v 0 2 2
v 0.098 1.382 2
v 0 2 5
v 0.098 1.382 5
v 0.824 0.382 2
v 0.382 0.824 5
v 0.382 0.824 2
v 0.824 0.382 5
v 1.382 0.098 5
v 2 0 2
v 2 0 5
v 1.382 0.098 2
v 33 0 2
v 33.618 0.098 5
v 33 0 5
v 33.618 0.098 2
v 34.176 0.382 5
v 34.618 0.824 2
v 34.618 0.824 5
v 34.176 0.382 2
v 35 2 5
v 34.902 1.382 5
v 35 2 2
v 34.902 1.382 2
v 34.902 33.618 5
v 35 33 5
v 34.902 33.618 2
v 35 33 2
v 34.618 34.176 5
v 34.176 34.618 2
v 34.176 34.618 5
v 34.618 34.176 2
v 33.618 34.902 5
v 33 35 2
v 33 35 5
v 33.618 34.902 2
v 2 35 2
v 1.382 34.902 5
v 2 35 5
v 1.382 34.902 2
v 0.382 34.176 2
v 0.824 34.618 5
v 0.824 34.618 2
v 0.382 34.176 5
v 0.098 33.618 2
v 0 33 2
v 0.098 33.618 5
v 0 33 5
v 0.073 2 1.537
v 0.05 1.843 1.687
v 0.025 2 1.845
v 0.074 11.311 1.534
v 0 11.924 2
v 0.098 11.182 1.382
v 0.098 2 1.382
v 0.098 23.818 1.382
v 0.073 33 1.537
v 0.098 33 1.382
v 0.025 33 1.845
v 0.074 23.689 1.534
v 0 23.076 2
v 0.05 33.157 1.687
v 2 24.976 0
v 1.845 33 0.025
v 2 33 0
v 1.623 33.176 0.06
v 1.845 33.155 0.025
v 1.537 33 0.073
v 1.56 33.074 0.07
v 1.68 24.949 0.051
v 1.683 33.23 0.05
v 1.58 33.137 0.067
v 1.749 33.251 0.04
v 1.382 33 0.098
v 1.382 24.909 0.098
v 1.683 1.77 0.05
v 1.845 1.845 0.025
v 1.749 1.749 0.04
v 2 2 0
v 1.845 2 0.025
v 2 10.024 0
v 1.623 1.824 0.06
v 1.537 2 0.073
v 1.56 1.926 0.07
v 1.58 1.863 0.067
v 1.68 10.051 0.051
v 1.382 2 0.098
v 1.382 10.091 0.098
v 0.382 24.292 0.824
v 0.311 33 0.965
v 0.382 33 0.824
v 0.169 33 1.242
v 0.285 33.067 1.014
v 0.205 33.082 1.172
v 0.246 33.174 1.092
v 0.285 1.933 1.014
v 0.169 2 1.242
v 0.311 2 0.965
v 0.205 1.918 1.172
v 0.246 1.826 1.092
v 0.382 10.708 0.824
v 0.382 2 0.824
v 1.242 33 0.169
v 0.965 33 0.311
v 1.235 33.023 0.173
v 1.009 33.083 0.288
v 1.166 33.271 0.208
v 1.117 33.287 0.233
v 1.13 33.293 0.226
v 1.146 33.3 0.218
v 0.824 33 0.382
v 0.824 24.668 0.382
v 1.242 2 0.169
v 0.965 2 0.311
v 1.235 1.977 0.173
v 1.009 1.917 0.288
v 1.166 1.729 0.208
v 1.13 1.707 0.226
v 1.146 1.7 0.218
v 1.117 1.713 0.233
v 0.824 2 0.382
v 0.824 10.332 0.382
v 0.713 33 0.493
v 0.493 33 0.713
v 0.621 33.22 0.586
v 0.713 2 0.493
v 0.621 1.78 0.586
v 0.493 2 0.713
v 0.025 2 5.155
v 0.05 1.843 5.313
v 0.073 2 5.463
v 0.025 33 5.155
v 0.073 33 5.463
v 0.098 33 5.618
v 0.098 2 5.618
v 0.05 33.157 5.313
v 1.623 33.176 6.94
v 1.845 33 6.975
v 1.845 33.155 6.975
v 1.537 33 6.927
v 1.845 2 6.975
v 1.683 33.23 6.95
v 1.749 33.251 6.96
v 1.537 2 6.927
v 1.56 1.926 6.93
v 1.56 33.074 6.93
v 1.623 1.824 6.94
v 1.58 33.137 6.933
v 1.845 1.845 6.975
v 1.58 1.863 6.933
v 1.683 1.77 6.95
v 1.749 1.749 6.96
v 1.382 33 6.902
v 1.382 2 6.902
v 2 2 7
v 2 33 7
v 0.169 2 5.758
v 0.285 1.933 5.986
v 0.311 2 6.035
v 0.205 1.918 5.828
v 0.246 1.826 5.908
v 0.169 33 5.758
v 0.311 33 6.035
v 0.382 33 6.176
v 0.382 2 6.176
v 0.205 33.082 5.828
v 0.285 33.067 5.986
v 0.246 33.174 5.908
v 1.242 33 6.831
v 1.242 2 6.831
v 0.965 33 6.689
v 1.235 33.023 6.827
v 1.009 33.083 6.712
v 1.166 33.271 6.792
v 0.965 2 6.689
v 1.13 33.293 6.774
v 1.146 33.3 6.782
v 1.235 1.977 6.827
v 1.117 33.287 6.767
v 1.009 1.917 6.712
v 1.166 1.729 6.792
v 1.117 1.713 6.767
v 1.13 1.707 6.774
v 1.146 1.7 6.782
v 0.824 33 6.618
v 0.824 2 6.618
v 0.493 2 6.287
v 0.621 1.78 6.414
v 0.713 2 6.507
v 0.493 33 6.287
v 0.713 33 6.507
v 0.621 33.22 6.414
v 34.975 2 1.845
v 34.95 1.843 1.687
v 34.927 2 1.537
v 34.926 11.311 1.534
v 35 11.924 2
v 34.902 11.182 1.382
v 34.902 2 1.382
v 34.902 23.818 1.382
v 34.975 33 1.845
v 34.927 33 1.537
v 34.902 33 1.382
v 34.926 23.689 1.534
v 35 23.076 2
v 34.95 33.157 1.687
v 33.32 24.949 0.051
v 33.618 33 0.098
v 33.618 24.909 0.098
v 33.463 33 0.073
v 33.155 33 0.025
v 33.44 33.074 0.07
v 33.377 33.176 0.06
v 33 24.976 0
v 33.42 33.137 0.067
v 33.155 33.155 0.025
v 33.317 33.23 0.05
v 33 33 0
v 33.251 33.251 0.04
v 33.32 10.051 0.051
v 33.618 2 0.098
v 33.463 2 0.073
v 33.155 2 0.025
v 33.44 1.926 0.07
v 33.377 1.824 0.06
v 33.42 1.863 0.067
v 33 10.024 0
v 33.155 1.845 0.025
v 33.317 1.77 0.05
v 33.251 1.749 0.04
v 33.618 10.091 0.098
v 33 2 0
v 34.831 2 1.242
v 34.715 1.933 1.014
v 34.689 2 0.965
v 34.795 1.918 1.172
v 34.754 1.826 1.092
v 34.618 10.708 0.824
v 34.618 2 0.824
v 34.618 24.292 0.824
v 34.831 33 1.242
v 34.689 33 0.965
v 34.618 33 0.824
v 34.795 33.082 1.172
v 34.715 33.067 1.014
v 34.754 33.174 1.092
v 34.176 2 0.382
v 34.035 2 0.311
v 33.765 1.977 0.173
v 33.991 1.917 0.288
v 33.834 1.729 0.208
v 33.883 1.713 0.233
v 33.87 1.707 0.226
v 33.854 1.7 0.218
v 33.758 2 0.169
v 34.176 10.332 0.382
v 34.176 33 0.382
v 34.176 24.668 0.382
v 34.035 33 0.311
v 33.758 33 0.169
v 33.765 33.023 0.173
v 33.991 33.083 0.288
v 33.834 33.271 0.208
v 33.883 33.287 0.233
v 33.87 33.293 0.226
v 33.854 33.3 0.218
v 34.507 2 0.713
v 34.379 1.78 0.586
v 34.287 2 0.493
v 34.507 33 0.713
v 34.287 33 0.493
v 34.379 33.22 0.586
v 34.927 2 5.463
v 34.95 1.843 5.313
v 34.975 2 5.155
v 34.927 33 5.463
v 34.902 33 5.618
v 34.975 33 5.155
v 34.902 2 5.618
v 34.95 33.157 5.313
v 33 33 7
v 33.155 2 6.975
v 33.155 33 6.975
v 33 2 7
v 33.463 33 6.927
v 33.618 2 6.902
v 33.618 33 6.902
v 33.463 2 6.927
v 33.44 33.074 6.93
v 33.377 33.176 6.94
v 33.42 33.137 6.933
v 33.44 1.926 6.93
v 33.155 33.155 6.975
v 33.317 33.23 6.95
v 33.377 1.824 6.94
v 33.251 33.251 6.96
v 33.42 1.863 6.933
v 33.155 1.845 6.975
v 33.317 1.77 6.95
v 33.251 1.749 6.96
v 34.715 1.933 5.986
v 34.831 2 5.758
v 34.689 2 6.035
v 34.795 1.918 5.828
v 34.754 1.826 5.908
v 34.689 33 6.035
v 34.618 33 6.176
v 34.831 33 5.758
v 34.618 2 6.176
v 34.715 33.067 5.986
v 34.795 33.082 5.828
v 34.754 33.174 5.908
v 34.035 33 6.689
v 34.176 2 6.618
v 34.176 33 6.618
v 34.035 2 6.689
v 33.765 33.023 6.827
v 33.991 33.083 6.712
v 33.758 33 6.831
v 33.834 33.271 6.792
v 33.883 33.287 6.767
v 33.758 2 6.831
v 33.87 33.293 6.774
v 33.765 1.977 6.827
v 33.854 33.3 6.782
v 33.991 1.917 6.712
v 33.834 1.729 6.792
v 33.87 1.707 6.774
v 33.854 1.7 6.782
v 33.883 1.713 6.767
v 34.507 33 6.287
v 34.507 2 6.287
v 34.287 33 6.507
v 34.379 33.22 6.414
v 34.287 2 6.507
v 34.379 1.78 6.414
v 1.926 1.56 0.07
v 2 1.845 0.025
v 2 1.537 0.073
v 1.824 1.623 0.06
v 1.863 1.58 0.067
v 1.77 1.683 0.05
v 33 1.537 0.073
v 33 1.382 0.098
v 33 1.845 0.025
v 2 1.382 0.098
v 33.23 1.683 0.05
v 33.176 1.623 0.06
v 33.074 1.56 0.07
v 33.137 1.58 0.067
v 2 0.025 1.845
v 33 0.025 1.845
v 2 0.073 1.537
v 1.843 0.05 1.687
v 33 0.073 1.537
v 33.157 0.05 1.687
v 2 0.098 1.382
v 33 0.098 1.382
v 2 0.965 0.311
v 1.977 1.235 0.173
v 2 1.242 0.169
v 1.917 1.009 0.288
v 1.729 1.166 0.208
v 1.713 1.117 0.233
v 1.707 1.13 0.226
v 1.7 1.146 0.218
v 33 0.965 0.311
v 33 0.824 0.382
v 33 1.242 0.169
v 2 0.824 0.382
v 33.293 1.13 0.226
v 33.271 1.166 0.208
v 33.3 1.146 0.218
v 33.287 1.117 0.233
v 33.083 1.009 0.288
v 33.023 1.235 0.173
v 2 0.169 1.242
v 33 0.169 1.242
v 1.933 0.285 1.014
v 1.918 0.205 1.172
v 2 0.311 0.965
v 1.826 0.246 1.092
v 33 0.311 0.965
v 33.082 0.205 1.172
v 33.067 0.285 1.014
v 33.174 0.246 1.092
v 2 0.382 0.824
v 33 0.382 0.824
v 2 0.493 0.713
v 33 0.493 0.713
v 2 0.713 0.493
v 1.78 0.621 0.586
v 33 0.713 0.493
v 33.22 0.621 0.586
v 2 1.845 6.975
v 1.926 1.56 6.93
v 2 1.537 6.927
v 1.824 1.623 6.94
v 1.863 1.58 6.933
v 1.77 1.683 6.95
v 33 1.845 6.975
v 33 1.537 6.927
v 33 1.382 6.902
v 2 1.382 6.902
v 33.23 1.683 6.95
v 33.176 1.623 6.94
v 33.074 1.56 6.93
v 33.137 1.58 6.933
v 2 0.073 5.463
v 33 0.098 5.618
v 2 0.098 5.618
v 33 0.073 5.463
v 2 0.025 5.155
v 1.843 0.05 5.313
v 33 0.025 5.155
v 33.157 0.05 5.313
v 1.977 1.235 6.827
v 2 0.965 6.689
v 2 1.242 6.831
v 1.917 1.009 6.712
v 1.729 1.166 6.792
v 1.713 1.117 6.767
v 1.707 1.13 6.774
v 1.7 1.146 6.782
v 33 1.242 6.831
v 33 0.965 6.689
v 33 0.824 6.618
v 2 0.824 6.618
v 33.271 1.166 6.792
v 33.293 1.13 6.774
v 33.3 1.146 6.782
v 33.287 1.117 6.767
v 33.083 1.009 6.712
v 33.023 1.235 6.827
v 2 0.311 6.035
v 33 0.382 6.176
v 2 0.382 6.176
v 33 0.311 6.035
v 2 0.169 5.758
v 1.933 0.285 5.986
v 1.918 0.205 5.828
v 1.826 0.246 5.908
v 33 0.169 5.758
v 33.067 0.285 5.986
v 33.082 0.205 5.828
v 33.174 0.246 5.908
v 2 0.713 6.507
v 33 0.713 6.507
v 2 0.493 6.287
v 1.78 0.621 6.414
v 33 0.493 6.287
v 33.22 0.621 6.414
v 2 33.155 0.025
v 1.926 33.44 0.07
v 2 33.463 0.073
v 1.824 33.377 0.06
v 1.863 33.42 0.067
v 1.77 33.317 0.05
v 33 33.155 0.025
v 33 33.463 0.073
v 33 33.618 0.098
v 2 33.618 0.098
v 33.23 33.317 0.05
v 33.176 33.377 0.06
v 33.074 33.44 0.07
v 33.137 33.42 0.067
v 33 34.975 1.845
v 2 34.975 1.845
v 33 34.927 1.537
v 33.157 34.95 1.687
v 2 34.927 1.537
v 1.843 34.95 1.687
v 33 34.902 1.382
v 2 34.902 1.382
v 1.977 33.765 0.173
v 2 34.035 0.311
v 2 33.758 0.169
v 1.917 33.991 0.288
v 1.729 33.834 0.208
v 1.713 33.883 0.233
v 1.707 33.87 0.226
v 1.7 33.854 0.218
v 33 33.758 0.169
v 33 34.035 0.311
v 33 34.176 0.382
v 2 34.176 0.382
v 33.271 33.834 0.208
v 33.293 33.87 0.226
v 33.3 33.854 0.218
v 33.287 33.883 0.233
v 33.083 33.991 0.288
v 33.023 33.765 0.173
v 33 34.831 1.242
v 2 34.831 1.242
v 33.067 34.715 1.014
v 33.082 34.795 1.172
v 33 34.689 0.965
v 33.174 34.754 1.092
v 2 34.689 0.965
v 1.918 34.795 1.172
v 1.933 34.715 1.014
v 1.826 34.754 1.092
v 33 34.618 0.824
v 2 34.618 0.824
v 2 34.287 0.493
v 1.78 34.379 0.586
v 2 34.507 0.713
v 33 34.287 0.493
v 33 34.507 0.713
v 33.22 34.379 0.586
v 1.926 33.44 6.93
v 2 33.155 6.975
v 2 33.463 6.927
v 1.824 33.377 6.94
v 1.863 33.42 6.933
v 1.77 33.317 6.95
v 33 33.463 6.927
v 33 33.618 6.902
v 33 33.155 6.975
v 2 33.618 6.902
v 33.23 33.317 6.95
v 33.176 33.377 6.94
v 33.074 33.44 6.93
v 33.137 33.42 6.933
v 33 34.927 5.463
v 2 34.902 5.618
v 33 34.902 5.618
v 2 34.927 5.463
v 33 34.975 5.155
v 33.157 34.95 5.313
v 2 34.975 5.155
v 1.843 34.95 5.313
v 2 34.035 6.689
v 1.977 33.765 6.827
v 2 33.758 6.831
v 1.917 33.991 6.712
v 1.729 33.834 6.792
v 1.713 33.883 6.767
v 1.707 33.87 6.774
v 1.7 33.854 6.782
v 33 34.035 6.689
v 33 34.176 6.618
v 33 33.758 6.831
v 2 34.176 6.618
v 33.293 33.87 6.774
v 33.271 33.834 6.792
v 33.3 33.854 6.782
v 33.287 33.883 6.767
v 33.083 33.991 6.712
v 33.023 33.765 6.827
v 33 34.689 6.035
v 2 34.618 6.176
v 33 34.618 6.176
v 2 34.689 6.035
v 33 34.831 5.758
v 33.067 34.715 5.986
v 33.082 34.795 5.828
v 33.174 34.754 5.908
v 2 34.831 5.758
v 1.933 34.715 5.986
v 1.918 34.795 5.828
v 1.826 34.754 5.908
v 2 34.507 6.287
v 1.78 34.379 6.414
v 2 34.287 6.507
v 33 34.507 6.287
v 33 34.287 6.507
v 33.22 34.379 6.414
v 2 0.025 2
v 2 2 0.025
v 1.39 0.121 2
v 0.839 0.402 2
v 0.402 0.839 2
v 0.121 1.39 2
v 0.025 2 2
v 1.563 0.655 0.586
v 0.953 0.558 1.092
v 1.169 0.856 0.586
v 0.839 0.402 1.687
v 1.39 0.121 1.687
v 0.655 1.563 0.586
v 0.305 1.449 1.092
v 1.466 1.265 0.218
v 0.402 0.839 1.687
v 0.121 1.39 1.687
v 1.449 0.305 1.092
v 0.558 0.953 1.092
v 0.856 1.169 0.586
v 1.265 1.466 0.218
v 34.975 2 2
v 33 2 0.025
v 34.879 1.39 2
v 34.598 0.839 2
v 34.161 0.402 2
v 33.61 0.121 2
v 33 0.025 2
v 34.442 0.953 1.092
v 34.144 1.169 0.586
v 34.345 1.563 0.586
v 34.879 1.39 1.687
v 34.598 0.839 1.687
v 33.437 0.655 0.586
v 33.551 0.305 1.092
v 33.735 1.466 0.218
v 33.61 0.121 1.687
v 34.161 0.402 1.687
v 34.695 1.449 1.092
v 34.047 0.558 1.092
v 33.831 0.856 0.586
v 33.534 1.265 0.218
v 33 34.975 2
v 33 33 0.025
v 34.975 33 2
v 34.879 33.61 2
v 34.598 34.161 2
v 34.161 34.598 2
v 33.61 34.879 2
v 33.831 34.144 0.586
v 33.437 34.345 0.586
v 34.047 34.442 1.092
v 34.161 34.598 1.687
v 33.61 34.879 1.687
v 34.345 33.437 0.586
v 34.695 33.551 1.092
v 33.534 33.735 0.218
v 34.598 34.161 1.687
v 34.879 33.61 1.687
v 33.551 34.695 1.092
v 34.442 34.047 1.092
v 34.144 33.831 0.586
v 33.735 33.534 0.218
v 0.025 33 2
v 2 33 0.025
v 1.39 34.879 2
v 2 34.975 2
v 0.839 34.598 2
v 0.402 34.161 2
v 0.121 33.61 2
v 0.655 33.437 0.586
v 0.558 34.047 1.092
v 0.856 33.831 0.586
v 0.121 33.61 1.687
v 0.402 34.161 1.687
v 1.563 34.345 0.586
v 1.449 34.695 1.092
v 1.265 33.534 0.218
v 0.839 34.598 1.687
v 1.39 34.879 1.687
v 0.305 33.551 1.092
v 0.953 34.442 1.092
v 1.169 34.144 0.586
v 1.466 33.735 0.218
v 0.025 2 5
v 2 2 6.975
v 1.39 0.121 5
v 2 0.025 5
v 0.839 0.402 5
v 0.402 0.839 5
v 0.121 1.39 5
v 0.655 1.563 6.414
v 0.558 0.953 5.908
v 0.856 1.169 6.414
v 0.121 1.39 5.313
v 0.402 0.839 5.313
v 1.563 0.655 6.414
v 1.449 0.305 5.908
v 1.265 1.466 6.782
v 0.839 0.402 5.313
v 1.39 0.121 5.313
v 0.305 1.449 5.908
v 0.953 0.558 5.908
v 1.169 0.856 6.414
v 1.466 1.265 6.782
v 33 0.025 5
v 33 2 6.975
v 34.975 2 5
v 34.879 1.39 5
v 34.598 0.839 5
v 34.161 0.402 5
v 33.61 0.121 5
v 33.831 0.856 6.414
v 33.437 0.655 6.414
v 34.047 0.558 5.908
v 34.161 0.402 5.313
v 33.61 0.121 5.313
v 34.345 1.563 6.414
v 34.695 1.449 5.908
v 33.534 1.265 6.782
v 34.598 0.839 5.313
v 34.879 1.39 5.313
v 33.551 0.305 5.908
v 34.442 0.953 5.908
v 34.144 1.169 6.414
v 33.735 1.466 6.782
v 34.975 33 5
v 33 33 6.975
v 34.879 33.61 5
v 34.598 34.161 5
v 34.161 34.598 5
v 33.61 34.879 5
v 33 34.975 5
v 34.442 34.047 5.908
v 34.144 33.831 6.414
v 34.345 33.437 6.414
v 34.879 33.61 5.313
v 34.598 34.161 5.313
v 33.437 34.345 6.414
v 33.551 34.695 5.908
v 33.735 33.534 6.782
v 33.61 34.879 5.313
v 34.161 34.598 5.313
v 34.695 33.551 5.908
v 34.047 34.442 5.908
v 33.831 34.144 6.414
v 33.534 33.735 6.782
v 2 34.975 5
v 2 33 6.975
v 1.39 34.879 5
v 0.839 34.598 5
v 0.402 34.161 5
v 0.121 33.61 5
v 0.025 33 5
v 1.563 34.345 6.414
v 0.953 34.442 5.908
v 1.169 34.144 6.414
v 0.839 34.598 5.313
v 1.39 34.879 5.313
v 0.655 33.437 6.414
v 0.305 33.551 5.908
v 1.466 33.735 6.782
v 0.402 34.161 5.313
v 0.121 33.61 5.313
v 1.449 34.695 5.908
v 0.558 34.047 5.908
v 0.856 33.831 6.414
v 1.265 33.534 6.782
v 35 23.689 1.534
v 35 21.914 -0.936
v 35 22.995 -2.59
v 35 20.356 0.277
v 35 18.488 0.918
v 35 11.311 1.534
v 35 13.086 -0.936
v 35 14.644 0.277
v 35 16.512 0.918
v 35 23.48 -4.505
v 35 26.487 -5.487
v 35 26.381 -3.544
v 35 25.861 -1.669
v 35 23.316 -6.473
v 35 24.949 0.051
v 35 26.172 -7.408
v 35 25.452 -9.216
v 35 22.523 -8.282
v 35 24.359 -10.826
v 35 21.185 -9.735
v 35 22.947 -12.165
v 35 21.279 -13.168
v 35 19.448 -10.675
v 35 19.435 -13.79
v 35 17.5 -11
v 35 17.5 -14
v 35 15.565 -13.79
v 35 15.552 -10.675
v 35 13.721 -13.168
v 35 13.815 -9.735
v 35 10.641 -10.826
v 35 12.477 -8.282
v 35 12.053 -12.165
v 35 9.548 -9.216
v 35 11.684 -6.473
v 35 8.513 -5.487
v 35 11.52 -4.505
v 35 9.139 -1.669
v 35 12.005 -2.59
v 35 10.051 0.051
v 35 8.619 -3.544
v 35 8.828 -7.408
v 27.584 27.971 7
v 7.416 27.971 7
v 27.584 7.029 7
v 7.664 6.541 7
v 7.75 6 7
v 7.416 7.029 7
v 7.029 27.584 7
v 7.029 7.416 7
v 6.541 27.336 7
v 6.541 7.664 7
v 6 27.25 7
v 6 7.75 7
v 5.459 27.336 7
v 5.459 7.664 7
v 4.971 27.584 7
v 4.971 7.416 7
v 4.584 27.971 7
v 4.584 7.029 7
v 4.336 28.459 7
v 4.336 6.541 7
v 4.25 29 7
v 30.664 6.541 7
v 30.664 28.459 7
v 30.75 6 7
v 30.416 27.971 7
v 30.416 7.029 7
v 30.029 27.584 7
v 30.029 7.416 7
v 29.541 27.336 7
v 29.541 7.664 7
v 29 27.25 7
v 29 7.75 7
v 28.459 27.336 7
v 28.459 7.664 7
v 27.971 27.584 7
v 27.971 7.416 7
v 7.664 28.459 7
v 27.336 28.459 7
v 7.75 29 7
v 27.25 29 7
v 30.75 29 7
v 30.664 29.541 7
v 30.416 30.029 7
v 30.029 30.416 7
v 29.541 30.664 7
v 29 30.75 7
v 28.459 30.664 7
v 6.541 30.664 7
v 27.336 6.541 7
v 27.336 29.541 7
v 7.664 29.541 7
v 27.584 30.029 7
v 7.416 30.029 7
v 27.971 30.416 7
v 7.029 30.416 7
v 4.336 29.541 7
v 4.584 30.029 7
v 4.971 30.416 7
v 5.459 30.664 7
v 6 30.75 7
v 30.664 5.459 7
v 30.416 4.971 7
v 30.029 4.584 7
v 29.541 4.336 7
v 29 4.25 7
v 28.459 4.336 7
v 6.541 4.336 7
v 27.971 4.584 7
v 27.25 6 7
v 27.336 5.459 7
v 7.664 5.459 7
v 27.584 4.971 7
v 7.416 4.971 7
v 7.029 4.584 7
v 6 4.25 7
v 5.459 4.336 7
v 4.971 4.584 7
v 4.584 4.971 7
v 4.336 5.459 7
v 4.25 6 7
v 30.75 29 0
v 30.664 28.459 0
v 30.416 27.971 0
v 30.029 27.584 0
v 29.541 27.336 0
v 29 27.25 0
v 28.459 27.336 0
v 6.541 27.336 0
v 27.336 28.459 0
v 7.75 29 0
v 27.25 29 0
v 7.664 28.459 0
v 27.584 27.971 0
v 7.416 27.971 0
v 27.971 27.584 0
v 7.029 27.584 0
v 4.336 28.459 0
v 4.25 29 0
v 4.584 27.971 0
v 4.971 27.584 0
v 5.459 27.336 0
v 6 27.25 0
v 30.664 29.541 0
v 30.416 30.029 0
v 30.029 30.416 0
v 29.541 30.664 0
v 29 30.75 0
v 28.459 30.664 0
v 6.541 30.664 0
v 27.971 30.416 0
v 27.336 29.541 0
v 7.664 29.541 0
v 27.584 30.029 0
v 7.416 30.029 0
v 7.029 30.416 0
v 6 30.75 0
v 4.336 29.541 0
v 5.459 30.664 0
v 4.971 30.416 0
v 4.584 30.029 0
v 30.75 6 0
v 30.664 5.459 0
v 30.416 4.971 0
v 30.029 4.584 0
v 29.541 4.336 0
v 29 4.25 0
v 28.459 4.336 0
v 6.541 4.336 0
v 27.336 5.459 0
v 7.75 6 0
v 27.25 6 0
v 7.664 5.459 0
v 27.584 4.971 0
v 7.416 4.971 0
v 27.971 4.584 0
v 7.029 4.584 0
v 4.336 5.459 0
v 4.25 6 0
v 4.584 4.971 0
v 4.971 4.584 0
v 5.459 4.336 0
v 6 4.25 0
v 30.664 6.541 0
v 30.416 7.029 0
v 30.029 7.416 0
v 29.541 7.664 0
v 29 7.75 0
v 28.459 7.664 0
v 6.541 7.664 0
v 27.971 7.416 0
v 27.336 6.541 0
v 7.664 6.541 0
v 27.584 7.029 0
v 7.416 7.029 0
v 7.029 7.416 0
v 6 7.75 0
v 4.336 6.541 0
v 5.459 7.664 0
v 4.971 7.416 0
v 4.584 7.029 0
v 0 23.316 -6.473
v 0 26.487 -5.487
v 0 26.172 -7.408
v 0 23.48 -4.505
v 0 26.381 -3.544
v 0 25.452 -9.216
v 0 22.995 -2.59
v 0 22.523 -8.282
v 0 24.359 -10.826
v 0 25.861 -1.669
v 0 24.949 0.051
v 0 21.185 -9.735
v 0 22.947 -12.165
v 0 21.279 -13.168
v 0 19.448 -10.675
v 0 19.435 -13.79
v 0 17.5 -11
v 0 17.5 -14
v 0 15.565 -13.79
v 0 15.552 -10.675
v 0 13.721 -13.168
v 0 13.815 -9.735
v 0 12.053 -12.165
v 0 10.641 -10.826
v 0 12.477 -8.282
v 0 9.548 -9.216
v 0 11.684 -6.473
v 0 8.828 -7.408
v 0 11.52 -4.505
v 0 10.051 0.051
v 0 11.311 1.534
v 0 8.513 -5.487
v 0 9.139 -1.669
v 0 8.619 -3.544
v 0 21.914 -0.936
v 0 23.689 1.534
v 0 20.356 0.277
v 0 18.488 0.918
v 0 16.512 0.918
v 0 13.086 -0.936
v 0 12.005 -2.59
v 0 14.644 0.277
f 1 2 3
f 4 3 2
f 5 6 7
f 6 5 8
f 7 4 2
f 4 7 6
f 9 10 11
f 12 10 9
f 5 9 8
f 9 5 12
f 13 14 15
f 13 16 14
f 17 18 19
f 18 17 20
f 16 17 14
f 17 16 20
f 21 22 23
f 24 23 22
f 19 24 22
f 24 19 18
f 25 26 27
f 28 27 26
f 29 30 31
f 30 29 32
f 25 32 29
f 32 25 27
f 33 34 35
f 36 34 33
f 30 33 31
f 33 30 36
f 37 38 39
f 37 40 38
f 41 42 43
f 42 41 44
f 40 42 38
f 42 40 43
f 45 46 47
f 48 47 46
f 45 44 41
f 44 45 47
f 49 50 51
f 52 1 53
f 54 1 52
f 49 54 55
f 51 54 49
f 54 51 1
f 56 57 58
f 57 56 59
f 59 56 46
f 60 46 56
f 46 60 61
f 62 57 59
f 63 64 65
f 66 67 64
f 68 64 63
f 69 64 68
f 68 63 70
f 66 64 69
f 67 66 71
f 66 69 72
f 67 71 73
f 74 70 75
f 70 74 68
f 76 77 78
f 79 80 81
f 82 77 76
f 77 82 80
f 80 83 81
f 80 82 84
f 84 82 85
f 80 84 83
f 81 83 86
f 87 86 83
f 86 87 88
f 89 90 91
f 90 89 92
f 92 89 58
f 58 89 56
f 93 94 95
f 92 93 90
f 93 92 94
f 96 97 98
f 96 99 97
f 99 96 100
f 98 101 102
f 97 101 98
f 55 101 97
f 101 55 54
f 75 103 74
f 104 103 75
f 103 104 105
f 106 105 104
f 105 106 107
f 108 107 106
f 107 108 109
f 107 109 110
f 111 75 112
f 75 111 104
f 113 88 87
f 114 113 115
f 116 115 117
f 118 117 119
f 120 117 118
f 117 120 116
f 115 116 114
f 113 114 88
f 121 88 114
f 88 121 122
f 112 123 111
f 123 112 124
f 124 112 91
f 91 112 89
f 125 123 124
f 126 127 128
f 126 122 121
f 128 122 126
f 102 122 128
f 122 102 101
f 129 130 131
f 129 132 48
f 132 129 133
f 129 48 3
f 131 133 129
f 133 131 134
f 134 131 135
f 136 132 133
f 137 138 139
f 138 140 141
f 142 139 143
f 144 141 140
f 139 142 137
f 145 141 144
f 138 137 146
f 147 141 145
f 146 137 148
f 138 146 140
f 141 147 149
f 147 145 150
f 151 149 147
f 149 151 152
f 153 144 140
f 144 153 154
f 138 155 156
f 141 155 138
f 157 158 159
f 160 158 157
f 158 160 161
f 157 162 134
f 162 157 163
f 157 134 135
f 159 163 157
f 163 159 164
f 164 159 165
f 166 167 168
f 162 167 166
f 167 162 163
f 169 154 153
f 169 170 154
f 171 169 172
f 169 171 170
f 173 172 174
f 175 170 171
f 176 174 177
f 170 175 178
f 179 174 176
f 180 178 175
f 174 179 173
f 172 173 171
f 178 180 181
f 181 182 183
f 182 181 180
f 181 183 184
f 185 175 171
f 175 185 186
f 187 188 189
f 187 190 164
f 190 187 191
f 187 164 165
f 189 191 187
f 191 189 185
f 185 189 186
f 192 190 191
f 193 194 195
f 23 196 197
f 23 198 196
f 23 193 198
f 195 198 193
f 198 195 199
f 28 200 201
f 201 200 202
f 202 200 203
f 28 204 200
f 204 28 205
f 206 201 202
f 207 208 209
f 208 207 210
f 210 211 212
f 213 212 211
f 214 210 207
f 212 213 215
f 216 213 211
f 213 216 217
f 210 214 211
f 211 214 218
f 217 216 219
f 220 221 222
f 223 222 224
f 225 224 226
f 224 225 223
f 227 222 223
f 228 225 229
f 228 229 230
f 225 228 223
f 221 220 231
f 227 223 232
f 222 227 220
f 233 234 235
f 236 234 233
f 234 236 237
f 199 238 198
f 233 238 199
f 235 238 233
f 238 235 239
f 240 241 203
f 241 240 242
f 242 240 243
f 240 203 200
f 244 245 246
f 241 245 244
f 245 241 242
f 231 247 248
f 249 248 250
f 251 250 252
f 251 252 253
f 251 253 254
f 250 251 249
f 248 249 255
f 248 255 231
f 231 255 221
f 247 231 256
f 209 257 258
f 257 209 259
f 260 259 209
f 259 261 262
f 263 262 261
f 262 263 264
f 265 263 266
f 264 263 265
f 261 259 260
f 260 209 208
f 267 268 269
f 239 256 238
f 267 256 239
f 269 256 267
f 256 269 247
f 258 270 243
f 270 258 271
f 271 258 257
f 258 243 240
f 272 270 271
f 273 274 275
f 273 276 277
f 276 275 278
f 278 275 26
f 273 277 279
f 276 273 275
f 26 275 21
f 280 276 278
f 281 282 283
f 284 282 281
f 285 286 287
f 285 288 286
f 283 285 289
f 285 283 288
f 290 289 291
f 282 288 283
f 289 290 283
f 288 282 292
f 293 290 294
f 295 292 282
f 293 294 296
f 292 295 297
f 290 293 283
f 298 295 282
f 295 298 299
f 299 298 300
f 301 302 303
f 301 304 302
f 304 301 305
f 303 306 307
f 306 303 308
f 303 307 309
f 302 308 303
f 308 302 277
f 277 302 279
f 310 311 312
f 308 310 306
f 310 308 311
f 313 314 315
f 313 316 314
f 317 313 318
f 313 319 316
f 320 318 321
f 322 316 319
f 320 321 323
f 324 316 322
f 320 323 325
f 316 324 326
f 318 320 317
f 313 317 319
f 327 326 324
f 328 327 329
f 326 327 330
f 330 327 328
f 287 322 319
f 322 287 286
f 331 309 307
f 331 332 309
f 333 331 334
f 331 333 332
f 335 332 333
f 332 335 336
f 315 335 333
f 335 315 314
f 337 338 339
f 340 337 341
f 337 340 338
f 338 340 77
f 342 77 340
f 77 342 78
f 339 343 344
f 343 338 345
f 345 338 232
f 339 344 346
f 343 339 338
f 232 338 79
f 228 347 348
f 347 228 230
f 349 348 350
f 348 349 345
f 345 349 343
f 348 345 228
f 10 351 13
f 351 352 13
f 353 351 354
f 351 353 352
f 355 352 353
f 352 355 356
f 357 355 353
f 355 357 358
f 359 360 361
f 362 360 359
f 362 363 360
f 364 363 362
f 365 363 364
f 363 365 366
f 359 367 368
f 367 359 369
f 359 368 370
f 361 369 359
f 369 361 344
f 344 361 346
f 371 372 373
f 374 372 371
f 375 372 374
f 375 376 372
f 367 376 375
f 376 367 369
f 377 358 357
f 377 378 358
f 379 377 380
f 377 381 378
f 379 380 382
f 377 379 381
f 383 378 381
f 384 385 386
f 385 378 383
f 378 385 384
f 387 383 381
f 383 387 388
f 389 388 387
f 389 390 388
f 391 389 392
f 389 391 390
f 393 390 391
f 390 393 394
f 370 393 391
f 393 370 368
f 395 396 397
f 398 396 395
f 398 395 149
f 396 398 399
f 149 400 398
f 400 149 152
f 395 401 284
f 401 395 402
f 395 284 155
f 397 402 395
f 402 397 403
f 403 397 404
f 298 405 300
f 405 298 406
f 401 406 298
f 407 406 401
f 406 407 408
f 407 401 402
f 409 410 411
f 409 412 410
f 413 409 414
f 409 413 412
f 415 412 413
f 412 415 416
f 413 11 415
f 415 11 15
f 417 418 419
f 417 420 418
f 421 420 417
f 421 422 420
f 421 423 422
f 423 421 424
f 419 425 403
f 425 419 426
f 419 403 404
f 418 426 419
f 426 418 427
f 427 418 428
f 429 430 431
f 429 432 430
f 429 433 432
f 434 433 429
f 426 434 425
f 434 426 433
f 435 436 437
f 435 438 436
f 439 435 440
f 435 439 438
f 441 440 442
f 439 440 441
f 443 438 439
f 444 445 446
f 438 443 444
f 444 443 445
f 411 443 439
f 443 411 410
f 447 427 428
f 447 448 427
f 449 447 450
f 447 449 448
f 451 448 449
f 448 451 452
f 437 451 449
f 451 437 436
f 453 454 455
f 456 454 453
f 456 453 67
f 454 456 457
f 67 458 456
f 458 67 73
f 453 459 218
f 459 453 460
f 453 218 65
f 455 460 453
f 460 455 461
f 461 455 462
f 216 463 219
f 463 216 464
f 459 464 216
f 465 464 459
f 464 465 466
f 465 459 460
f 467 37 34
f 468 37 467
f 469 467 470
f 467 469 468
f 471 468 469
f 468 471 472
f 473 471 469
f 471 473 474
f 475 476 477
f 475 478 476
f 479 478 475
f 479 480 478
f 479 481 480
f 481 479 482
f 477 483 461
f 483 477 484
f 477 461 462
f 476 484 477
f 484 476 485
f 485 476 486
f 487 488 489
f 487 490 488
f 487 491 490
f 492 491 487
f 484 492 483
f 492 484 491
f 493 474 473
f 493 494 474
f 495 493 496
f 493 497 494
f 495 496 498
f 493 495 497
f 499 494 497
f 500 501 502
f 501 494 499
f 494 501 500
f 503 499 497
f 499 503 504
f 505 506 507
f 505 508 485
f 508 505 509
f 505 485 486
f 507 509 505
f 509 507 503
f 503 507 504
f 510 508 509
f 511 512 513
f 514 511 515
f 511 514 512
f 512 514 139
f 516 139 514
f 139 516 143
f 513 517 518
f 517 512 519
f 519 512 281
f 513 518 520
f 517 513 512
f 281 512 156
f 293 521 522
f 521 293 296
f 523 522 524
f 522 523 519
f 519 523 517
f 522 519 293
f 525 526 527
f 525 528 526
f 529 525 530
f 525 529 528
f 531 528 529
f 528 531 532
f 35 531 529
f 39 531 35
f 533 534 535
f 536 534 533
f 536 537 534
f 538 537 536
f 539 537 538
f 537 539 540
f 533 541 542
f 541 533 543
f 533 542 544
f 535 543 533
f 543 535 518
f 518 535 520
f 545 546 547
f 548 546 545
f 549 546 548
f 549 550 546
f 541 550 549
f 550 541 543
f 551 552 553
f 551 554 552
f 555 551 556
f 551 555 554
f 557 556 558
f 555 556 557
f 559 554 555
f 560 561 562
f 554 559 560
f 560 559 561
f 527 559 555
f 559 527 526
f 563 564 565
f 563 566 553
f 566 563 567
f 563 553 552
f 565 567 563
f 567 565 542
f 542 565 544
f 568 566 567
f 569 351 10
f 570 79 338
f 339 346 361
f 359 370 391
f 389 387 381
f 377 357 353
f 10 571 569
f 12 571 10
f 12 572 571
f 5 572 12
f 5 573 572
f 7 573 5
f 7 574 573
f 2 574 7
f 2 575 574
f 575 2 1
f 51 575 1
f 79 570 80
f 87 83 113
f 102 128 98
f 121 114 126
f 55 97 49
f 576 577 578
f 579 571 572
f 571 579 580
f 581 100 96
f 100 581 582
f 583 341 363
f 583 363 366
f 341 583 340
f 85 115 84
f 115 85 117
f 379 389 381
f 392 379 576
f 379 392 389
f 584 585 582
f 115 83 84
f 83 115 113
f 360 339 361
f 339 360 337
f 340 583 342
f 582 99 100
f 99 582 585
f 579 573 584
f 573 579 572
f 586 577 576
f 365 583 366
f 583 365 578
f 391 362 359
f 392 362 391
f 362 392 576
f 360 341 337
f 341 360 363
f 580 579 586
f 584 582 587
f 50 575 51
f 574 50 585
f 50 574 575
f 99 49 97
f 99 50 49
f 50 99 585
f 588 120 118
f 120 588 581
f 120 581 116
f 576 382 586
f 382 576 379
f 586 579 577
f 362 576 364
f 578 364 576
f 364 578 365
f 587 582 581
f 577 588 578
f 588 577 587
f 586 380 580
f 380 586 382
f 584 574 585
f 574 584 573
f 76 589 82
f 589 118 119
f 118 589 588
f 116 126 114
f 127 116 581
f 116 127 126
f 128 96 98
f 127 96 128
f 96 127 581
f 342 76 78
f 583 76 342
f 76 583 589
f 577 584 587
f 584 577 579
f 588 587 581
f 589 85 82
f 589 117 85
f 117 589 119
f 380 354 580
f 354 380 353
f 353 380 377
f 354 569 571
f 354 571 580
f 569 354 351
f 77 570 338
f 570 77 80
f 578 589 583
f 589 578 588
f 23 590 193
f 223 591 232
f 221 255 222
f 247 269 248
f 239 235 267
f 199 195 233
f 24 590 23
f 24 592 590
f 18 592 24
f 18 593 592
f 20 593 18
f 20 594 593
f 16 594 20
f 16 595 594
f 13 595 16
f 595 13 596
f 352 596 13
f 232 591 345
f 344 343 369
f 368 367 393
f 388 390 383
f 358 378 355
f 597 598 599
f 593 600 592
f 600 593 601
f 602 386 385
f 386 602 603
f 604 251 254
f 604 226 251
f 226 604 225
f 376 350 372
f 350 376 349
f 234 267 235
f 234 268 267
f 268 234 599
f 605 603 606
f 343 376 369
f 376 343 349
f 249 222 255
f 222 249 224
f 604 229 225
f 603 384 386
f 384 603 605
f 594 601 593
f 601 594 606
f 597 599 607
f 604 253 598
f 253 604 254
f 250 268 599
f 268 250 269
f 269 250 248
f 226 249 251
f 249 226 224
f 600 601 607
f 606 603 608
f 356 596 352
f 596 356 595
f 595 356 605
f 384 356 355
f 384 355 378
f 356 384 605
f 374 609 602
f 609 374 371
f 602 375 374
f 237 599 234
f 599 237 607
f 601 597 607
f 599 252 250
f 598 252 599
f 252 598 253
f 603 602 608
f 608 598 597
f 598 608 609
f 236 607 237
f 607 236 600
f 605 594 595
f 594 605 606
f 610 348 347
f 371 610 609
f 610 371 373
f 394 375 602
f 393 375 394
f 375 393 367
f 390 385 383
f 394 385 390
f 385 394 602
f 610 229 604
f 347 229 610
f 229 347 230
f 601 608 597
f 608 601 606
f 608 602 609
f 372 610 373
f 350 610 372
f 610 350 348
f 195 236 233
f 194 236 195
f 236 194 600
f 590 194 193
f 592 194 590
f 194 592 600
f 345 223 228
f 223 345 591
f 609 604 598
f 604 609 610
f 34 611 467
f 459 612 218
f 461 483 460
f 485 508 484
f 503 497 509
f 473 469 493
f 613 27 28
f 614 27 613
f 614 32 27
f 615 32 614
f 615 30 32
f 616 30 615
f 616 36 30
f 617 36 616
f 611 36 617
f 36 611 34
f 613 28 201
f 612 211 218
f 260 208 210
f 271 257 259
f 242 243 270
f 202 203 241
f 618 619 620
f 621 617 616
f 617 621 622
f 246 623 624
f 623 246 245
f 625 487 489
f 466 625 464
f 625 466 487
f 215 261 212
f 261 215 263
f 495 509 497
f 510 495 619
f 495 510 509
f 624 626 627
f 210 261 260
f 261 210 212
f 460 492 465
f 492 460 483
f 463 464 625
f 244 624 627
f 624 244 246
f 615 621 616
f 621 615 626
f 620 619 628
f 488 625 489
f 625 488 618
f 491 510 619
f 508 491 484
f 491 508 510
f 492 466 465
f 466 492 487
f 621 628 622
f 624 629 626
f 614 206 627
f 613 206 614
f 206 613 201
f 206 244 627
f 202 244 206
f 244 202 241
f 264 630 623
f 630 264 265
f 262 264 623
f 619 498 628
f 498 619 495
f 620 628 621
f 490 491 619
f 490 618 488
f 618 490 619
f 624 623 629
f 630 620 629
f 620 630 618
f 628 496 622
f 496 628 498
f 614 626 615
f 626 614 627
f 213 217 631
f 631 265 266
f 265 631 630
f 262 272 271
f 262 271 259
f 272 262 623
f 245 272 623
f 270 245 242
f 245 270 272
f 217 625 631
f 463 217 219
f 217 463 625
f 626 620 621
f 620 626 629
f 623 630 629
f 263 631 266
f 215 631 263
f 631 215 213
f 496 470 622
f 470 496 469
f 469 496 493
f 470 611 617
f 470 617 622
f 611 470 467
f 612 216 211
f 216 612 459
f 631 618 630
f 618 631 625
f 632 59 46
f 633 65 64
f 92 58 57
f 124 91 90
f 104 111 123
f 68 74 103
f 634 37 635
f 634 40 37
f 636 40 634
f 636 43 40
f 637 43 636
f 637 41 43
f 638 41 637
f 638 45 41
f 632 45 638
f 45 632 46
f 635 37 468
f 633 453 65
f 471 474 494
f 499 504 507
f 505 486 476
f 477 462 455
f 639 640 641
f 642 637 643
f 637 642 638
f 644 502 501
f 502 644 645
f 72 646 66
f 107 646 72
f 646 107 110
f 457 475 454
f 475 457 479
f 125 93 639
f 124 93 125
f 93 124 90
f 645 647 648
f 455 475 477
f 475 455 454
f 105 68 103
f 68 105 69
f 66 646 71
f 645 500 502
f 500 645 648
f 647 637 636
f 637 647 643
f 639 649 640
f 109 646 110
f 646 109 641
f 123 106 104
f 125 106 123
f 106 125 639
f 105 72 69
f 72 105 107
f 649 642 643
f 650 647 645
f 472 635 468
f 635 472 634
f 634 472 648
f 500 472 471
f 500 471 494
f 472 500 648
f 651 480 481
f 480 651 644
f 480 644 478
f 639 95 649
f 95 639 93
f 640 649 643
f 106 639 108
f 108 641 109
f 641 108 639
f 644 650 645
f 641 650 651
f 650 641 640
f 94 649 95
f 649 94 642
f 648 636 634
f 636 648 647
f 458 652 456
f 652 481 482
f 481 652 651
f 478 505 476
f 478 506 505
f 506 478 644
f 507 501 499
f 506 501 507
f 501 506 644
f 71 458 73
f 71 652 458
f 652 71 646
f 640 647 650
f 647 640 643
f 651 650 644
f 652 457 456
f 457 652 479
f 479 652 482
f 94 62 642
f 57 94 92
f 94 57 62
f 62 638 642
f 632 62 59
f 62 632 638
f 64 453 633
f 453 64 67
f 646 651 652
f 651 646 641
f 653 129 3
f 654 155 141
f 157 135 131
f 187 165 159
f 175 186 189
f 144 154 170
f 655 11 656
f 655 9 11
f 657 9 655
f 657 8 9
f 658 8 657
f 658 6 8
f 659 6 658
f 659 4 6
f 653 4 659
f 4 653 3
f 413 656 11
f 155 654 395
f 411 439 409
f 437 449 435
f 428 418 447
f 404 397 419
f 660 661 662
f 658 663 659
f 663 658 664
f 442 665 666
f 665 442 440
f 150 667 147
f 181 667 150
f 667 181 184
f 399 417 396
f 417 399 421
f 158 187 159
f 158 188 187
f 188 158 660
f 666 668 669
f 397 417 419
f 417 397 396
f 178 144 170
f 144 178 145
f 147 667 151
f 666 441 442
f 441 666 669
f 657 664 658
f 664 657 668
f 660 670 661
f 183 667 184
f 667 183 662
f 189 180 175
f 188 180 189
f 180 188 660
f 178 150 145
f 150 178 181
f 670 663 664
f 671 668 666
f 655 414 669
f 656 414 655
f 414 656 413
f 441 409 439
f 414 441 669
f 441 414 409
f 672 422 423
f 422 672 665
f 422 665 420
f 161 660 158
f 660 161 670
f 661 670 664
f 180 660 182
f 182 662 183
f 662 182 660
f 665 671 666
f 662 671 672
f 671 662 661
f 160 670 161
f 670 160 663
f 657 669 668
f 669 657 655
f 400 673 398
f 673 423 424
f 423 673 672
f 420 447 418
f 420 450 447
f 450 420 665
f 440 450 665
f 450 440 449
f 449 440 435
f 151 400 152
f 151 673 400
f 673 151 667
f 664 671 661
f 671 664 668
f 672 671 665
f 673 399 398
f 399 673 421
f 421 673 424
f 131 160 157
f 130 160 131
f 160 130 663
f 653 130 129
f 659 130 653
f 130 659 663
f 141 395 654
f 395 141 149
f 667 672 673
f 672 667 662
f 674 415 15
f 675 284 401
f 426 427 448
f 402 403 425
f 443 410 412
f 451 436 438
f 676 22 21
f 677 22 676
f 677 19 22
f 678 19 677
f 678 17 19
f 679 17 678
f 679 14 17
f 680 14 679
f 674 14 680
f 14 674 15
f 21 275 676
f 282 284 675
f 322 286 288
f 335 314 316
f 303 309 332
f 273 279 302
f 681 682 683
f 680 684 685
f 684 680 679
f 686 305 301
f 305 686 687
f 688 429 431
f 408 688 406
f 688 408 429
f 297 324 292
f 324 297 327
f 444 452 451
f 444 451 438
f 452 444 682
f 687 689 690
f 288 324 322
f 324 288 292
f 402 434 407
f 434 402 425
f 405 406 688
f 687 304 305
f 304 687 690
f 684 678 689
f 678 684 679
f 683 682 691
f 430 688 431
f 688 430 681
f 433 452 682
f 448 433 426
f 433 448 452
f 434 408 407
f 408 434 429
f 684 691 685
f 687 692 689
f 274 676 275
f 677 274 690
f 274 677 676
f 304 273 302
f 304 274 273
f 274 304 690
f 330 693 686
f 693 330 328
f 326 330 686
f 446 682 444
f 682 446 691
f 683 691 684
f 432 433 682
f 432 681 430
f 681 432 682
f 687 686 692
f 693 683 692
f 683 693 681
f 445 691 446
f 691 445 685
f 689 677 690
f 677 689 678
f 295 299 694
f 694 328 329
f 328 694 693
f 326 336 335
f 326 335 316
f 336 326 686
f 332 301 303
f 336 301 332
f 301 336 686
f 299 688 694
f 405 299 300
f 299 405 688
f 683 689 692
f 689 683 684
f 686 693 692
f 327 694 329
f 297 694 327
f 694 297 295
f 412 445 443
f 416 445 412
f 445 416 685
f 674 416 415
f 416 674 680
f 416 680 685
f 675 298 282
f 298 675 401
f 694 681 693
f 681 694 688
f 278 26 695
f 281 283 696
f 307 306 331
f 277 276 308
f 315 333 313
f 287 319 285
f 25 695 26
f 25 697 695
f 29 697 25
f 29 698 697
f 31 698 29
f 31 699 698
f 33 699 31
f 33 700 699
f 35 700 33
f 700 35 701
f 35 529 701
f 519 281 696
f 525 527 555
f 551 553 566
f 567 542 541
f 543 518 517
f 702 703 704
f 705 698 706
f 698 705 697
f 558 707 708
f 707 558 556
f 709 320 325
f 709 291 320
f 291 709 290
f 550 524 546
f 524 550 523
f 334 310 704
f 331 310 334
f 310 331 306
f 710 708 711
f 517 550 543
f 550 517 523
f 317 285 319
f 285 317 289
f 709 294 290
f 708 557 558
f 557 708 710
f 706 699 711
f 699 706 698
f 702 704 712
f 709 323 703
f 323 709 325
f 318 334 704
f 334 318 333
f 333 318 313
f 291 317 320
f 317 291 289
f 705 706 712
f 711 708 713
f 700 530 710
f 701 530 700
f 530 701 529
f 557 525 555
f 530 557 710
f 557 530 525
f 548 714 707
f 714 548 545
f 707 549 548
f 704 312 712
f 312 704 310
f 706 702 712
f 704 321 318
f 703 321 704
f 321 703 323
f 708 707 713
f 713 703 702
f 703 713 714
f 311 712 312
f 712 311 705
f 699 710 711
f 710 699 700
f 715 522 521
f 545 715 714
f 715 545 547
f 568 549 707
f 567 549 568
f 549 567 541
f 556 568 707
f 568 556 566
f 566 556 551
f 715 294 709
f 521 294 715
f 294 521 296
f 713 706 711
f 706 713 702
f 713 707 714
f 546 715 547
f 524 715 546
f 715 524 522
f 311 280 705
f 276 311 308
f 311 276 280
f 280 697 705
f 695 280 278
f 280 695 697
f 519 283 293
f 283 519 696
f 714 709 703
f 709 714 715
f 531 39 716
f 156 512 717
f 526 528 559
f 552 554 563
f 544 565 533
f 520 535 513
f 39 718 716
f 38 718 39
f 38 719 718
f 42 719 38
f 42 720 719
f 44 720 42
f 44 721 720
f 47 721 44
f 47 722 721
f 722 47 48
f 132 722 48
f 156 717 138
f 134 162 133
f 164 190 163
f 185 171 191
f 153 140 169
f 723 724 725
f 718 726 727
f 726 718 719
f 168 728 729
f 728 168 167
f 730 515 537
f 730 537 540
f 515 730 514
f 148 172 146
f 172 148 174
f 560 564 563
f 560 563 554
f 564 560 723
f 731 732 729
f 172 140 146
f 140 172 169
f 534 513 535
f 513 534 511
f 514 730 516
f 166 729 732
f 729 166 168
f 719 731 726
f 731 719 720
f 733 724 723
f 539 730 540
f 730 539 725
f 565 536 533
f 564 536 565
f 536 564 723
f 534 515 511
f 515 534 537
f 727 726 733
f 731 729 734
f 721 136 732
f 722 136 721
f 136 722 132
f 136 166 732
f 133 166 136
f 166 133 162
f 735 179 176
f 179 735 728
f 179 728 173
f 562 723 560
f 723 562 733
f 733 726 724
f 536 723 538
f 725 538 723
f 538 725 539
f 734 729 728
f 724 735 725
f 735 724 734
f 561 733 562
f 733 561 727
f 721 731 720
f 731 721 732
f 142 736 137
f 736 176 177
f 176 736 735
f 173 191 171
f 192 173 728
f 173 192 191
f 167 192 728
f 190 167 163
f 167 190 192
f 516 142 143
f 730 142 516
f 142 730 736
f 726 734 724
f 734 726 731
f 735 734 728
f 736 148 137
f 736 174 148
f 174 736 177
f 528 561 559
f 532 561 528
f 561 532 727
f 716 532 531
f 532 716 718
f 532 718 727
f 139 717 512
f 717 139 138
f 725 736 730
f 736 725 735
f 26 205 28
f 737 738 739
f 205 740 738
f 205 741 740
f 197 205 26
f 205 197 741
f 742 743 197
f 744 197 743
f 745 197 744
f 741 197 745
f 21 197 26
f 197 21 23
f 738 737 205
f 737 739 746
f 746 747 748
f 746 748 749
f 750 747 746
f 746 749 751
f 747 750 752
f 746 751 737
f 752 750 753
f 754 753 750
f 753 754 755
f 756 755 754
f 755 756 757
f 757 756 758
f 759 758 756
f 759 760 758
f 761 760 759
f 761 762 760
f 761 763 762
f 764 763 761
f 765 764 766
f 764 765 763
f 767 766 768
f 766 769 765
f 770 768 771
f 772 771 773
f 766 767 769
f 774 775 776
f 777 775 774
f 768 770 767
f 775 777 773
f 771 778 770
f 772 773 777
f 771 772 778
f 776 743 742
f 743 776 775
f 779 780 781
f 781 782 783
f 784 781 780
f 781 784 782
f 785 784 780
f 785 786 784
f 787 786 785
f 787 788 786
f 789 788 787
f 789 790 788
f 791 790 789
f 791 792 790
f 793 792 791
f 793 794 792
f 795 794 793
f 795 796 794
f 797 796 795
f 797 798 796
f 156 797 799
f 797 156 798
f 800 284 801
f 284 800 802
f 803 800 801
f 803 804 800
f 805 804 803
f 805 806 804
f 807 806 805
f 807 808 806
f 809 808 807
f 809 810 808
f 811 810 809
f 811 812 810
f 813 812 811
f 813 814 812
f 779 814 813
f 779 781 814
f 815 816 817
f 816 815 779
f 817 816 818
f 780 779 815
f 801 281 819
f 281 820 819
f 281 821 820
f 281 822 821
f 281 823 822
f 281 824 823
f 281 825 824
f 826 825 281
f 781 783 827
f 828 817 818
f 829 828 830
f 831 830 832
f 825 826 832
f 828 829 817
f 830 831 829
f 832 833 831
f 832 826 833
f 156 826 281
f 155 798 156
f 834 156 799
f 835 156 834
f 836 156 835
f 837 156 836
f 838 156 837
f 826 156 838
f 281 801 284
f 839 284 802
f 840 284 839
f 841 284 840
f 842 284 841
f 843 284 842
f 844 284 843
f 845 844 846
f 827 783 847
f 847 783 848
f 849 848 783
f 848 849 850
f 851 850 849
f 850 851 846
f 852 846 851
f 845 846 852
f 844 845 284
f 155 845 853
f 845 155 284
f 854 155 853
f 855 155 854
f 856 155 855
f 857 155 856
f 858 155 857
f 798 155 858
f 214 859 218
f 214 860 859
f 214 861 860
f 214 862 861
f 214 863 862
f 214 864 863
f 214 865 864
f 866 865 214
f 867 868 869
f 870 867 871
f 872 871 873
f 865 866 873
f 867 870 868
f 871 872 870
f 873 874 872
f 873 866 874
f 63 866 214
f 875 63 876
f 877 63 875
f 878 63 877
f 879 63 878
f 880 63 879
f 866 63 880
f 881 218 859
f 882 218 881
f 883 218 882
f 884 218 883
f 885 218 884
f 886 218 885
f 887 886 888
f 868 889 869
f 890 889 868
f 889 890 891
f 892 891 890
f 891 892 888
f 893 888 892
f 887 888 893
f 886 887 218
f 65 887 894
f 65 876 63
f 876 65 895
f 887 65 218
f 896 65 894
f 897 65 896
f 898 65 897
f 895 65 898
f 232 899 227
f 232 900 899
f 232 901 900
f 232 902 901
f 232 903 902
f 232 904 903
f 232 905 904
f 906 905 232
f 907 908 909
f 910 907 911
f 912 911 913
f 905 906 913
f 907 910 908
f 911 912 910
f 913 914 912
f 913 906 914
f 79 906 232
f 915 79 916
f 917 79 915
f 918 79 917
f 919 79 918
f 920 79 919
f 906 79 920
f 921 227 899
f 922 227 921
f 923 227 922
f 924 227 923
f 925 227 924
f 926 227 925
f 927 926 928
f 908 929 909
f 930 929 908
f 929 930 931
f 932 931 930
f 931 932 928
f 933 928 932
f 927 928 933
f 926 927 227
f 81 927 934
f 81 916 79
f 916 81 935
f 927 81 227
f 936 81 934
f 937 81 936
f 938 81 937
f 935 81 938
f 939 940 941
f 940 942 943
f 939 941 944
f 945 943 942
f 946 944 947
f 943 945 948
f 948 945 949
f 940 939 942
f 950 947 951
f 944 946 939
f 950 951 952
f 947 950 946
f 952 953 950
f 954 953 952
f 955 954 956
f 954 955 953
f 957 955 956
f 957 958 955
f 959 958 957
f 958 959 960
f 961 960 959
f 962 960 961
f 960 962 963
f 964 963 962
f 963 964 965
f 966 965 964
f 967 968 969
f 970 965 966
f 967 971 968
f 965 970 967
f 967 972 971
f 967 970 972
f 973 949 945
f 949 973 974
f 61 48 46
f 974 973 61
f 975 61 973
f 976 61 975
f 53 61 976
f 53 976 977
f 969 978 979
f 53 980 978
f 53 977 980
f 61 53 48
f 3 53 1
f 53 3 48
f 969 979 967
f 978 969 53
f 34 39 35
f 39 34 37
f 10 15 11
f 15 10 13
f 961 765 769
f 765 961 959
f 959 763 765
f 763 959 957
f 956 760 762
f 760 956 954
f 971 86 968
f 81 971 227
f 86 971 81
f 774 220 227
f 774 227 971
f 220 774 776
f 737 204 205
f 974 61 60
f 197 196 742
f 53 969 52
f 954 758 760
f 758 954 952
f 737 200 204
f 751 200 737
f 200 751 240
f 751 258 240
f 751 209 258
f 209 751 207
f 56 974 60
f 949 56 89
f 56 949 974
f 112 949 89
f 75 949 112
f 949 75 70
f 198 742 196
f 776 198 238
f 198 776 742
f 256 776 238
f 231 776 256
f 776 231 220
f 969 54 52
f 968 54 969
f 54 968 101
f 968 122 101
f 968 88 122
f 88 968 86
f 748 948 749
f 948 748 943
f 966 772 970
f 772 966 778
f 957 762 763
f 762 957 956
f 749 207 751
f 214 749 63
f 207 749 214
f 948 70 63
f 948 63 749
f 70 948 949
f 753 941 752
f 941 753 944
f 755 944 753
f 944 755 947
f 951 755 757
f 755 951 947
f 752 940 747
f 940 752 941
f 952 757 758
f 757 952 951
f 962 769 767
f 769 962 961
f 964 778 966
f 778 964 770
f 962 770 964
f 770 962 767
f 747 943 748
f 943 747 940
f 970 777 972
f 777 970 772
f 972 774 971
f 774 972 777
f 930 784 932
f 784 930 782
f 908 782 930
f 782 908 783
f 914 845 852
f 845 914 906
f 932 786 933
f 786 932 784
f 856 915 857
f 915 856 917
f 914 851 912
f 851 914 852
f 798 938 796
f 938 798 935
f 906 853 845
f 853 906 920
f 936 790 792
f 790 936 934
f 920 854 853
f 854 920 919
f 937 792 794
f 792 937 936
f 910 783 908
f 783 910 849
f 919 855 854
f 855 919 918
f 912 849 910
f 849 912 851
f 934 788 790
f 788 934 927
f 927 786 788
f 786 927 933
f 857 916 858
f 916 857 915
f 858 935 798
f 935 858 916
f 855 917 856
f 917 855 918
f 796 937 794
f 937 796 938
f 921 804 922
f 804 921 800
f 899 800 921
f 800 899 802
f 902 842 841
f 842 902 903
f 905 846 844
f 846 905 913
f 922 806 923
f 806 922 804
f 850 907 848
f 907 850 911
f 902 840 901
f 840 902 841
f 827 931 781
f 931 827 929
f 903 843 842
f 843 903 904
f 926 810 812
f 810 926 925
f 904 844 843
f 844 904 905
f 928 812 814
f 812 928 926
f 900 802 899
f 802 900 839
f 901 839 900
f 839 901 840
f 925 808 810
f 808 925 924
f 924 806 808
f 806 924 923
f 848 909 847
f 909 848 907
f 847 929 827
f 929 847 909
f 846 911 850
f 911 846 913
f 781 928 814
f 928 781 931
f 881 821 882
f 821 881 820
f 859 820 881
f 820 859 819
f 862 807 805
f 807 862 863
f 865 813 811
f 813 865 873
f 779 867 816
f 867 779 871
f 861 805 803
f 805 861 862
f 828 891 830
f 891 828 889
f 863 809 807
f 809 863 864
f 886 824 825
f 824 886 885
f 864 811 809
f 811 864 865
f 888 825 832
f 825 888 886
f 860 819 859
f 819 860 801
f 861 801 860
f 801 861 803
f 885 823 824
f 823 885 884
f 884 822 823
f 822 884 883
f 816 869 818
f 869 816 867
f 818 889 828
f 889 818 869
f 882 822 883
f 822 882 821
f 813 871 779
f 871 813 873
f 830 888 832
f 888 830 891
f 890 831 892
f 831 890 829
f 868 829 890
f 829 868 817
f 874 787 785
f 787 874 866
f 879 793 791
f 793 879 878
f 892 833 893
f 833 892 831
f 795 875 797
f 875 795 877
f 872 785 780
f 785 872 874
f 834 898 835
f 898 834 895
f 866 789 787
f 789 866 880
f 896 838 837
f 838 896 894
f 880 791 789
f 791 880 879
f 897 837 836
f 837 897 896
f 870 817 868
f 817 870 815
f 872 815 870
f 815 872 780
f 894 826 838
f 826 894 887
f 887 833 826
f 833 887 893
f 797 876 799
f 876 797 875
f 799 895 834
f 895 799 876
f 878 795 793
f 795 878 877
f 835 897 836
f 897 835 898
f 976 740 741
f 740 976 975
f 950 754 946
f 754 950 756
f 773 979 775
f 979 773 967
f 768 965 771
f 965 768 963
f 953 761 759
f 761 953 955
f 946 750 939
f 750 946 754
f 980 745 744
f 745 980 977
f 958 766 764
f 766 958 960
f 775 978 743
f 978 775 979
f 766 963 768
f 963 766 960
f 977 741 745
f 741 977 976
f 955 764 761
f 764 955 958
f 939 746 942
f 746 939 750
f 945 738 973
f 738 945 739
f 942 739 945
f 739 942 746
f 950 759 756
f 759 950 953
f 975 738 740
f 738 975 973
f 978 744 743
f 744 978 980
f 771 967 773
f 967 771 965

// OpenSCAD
// Cube with rounded edges

el = 1e-2;
fn = 20;

module rcorner ( r )
{
   difference() {
      translate ( -el * [ 1, 1, 1 ] ) cube( r + el );
      translate ( [ r, r, r ] ) sphere( r, $fn = fn );
   }
}

module redge ( r, l )
{
   difference() {
      translate ( -2 * el * [ 1, 1, 1 ] ) cube( [ r + 2 * el, r + 2 * el, l + 4 * el ] );
      translate ( [ r, r, -el ] ) cylinder( r = r, h = l + 2 * el, $fn = fn );
   }
}

module rcube( size = 1, center = false, r = 0 )
{
        sz = len( size ) == undef ? [ size, size, size ] : size;

        difference() {
                cube( size = sz );
                union (){
                        // Round the edges:

                        redge( r ,sz[2] );
                        translate( [ sz[0], 0, 0 ] ) rotate( 90, [ 0, 0, 1 ] ) redge( r ,sz[2] );
                        translate( [ sz[0], sz[1], 0 ] ) rotate( 180, [ 0, 0, 1 ] ) redge( r ,sz[2] );
                        translate( [ 0, sz[1], 0 ] ) rotate( 270, [ 0, 0, 1 ] ) redge( r ,sz[2] );

                        translate( [ 0, sz[1], 0 ] ) rotate ( 90, [ 1, 0, 0 ] ) redge( r ,sz[1] );
                        translate( [ 0, 0, sz[2] ] ) rotate ( -90, [ 1, 0, 0 ] ) redge( r ,sz[1] );
                        translate( [ sz[0], 0, 0 ] ) rotate ( 180, [ 0, 1, 1 ] ) redge( r ,sz[1] );
                        translate( [ sz[0], sz[1], sz[2] ] ) rotate ( 180, [ 0, 1, -1 ] ) redge( r ,sz[1] );

                        translate( [ sz[0], 0, 0 ] ) rotate( -90, [ 0, 1, 0 ] )  redge( r ,sz[0] );
                        translate( [ 0, 0, sz[2] ] ) rotate( 90, [ 0, 1, 0 ] )  redge( r ,sz[0] );
                        translate( [ 0, sz[1], 0 ] ) rotate( 180, [ 1, 0, 1 ] )  redge( r ,sz[0] );
                        translate( [ sz[0], sz[1], sz[2] ] ) rotate( 180, [ 1, 0, -1 ] )  redge( r ,sz[0] );

                        // Round the corners:
                        rcorner( r );
                        translate( [ sz[0], 0, 0 ] ) rotate( 90, [ 0, 0, 1 ] ) rcorner( r );
                        translate( [ sz[0], sz[1], 0 ] ) rotate( 180, [ 0, 0, 1 ] ) rcorner( r );
                        translate( [ 0, sz[1], 0 ] ) rotate( 270, [ 0, 0, 1 ] ) rcorner( r );

                        translate( [ 0, 0, sz[2] ] ) rotate( 90, [ 0, 0, 1 ] ) rotate( 180, [ 1, 0, 0 ] ) rcorner( r );
                        translate( [ sz[0], 0, sz[2] ] ) rotate( 180, [ 0, 0, 1 ] ) rotate( 180, [ 1, 0, 0 ] ) rcorner( r );
                        translate( [ sz[0], sz[1], sz[2] ] ) rotate( 270, [ 0, 0, 1 ] ) rotate( 180, [ 1, 0, 0 ] ) rcorner( r );
                        translate( [ 0, sz[1], sz[2] ] ) rotate( 180, [ 1, 0, 0 ] ) rcorner( r );

                }
        }
}

delta = ( 35 - 23 ) / 2;
hole_rad = 1.75;
inner_hole = 35 - 3 * delta;

gm_hole_dist = 21;
pf_hole_dist = 25;
gm_attach_width = 27;

tol = 0.2;

// http://reprap.org/wiki/File:Jhn_nozzle_holder_v5.jpg
groove_inner_rad = ( 12 + tol ) / 2;
groove_rad = ( 15.875 + tol ) / 2;

render( convexity = 10 ){

	// Carriage attachment:
	difference(){
		union() {
		// Main body:
		rcube( [ 35, 35, 7 ], r = 2 );

		// Threaded rod fixture:
		translate( [ 0, 35 / 2, -5 ] )
			rotate( 90, [ 0, 1, 0 ] )
				difference() {
					cylinder( h = 35, r = 9 );
				}
		}

		// Screw holes:
		translate( [ delta, delta, -0.1 ] )
			cylinder( h = 7.2, r = hole_rad, $fn = 20 );
		translate( [ 35 - delta, delta, -0.1 ] )
			cylinder( h = 7.2, r = hole_rad, $fn = 20 );
		translate( [ 35 - delta, 35 - delta, -0.1 ] )
			cylinder( h = 7.2, r = hole_rad, $fn = 20 );
		translate( [ delta, 35 - delta, -0.1 ] )
			cylinder( h = 7.2, r = hole_rad, $fn = 20 );

		translate( [ 0, 35 / 2, -5 ] )
			rotate( 90, [ 0, 1, 0 ] )
				translate( [ 0, 0, -0.05 ] )
					cylinder( h = 35.1, r = 6 );
	}

}
